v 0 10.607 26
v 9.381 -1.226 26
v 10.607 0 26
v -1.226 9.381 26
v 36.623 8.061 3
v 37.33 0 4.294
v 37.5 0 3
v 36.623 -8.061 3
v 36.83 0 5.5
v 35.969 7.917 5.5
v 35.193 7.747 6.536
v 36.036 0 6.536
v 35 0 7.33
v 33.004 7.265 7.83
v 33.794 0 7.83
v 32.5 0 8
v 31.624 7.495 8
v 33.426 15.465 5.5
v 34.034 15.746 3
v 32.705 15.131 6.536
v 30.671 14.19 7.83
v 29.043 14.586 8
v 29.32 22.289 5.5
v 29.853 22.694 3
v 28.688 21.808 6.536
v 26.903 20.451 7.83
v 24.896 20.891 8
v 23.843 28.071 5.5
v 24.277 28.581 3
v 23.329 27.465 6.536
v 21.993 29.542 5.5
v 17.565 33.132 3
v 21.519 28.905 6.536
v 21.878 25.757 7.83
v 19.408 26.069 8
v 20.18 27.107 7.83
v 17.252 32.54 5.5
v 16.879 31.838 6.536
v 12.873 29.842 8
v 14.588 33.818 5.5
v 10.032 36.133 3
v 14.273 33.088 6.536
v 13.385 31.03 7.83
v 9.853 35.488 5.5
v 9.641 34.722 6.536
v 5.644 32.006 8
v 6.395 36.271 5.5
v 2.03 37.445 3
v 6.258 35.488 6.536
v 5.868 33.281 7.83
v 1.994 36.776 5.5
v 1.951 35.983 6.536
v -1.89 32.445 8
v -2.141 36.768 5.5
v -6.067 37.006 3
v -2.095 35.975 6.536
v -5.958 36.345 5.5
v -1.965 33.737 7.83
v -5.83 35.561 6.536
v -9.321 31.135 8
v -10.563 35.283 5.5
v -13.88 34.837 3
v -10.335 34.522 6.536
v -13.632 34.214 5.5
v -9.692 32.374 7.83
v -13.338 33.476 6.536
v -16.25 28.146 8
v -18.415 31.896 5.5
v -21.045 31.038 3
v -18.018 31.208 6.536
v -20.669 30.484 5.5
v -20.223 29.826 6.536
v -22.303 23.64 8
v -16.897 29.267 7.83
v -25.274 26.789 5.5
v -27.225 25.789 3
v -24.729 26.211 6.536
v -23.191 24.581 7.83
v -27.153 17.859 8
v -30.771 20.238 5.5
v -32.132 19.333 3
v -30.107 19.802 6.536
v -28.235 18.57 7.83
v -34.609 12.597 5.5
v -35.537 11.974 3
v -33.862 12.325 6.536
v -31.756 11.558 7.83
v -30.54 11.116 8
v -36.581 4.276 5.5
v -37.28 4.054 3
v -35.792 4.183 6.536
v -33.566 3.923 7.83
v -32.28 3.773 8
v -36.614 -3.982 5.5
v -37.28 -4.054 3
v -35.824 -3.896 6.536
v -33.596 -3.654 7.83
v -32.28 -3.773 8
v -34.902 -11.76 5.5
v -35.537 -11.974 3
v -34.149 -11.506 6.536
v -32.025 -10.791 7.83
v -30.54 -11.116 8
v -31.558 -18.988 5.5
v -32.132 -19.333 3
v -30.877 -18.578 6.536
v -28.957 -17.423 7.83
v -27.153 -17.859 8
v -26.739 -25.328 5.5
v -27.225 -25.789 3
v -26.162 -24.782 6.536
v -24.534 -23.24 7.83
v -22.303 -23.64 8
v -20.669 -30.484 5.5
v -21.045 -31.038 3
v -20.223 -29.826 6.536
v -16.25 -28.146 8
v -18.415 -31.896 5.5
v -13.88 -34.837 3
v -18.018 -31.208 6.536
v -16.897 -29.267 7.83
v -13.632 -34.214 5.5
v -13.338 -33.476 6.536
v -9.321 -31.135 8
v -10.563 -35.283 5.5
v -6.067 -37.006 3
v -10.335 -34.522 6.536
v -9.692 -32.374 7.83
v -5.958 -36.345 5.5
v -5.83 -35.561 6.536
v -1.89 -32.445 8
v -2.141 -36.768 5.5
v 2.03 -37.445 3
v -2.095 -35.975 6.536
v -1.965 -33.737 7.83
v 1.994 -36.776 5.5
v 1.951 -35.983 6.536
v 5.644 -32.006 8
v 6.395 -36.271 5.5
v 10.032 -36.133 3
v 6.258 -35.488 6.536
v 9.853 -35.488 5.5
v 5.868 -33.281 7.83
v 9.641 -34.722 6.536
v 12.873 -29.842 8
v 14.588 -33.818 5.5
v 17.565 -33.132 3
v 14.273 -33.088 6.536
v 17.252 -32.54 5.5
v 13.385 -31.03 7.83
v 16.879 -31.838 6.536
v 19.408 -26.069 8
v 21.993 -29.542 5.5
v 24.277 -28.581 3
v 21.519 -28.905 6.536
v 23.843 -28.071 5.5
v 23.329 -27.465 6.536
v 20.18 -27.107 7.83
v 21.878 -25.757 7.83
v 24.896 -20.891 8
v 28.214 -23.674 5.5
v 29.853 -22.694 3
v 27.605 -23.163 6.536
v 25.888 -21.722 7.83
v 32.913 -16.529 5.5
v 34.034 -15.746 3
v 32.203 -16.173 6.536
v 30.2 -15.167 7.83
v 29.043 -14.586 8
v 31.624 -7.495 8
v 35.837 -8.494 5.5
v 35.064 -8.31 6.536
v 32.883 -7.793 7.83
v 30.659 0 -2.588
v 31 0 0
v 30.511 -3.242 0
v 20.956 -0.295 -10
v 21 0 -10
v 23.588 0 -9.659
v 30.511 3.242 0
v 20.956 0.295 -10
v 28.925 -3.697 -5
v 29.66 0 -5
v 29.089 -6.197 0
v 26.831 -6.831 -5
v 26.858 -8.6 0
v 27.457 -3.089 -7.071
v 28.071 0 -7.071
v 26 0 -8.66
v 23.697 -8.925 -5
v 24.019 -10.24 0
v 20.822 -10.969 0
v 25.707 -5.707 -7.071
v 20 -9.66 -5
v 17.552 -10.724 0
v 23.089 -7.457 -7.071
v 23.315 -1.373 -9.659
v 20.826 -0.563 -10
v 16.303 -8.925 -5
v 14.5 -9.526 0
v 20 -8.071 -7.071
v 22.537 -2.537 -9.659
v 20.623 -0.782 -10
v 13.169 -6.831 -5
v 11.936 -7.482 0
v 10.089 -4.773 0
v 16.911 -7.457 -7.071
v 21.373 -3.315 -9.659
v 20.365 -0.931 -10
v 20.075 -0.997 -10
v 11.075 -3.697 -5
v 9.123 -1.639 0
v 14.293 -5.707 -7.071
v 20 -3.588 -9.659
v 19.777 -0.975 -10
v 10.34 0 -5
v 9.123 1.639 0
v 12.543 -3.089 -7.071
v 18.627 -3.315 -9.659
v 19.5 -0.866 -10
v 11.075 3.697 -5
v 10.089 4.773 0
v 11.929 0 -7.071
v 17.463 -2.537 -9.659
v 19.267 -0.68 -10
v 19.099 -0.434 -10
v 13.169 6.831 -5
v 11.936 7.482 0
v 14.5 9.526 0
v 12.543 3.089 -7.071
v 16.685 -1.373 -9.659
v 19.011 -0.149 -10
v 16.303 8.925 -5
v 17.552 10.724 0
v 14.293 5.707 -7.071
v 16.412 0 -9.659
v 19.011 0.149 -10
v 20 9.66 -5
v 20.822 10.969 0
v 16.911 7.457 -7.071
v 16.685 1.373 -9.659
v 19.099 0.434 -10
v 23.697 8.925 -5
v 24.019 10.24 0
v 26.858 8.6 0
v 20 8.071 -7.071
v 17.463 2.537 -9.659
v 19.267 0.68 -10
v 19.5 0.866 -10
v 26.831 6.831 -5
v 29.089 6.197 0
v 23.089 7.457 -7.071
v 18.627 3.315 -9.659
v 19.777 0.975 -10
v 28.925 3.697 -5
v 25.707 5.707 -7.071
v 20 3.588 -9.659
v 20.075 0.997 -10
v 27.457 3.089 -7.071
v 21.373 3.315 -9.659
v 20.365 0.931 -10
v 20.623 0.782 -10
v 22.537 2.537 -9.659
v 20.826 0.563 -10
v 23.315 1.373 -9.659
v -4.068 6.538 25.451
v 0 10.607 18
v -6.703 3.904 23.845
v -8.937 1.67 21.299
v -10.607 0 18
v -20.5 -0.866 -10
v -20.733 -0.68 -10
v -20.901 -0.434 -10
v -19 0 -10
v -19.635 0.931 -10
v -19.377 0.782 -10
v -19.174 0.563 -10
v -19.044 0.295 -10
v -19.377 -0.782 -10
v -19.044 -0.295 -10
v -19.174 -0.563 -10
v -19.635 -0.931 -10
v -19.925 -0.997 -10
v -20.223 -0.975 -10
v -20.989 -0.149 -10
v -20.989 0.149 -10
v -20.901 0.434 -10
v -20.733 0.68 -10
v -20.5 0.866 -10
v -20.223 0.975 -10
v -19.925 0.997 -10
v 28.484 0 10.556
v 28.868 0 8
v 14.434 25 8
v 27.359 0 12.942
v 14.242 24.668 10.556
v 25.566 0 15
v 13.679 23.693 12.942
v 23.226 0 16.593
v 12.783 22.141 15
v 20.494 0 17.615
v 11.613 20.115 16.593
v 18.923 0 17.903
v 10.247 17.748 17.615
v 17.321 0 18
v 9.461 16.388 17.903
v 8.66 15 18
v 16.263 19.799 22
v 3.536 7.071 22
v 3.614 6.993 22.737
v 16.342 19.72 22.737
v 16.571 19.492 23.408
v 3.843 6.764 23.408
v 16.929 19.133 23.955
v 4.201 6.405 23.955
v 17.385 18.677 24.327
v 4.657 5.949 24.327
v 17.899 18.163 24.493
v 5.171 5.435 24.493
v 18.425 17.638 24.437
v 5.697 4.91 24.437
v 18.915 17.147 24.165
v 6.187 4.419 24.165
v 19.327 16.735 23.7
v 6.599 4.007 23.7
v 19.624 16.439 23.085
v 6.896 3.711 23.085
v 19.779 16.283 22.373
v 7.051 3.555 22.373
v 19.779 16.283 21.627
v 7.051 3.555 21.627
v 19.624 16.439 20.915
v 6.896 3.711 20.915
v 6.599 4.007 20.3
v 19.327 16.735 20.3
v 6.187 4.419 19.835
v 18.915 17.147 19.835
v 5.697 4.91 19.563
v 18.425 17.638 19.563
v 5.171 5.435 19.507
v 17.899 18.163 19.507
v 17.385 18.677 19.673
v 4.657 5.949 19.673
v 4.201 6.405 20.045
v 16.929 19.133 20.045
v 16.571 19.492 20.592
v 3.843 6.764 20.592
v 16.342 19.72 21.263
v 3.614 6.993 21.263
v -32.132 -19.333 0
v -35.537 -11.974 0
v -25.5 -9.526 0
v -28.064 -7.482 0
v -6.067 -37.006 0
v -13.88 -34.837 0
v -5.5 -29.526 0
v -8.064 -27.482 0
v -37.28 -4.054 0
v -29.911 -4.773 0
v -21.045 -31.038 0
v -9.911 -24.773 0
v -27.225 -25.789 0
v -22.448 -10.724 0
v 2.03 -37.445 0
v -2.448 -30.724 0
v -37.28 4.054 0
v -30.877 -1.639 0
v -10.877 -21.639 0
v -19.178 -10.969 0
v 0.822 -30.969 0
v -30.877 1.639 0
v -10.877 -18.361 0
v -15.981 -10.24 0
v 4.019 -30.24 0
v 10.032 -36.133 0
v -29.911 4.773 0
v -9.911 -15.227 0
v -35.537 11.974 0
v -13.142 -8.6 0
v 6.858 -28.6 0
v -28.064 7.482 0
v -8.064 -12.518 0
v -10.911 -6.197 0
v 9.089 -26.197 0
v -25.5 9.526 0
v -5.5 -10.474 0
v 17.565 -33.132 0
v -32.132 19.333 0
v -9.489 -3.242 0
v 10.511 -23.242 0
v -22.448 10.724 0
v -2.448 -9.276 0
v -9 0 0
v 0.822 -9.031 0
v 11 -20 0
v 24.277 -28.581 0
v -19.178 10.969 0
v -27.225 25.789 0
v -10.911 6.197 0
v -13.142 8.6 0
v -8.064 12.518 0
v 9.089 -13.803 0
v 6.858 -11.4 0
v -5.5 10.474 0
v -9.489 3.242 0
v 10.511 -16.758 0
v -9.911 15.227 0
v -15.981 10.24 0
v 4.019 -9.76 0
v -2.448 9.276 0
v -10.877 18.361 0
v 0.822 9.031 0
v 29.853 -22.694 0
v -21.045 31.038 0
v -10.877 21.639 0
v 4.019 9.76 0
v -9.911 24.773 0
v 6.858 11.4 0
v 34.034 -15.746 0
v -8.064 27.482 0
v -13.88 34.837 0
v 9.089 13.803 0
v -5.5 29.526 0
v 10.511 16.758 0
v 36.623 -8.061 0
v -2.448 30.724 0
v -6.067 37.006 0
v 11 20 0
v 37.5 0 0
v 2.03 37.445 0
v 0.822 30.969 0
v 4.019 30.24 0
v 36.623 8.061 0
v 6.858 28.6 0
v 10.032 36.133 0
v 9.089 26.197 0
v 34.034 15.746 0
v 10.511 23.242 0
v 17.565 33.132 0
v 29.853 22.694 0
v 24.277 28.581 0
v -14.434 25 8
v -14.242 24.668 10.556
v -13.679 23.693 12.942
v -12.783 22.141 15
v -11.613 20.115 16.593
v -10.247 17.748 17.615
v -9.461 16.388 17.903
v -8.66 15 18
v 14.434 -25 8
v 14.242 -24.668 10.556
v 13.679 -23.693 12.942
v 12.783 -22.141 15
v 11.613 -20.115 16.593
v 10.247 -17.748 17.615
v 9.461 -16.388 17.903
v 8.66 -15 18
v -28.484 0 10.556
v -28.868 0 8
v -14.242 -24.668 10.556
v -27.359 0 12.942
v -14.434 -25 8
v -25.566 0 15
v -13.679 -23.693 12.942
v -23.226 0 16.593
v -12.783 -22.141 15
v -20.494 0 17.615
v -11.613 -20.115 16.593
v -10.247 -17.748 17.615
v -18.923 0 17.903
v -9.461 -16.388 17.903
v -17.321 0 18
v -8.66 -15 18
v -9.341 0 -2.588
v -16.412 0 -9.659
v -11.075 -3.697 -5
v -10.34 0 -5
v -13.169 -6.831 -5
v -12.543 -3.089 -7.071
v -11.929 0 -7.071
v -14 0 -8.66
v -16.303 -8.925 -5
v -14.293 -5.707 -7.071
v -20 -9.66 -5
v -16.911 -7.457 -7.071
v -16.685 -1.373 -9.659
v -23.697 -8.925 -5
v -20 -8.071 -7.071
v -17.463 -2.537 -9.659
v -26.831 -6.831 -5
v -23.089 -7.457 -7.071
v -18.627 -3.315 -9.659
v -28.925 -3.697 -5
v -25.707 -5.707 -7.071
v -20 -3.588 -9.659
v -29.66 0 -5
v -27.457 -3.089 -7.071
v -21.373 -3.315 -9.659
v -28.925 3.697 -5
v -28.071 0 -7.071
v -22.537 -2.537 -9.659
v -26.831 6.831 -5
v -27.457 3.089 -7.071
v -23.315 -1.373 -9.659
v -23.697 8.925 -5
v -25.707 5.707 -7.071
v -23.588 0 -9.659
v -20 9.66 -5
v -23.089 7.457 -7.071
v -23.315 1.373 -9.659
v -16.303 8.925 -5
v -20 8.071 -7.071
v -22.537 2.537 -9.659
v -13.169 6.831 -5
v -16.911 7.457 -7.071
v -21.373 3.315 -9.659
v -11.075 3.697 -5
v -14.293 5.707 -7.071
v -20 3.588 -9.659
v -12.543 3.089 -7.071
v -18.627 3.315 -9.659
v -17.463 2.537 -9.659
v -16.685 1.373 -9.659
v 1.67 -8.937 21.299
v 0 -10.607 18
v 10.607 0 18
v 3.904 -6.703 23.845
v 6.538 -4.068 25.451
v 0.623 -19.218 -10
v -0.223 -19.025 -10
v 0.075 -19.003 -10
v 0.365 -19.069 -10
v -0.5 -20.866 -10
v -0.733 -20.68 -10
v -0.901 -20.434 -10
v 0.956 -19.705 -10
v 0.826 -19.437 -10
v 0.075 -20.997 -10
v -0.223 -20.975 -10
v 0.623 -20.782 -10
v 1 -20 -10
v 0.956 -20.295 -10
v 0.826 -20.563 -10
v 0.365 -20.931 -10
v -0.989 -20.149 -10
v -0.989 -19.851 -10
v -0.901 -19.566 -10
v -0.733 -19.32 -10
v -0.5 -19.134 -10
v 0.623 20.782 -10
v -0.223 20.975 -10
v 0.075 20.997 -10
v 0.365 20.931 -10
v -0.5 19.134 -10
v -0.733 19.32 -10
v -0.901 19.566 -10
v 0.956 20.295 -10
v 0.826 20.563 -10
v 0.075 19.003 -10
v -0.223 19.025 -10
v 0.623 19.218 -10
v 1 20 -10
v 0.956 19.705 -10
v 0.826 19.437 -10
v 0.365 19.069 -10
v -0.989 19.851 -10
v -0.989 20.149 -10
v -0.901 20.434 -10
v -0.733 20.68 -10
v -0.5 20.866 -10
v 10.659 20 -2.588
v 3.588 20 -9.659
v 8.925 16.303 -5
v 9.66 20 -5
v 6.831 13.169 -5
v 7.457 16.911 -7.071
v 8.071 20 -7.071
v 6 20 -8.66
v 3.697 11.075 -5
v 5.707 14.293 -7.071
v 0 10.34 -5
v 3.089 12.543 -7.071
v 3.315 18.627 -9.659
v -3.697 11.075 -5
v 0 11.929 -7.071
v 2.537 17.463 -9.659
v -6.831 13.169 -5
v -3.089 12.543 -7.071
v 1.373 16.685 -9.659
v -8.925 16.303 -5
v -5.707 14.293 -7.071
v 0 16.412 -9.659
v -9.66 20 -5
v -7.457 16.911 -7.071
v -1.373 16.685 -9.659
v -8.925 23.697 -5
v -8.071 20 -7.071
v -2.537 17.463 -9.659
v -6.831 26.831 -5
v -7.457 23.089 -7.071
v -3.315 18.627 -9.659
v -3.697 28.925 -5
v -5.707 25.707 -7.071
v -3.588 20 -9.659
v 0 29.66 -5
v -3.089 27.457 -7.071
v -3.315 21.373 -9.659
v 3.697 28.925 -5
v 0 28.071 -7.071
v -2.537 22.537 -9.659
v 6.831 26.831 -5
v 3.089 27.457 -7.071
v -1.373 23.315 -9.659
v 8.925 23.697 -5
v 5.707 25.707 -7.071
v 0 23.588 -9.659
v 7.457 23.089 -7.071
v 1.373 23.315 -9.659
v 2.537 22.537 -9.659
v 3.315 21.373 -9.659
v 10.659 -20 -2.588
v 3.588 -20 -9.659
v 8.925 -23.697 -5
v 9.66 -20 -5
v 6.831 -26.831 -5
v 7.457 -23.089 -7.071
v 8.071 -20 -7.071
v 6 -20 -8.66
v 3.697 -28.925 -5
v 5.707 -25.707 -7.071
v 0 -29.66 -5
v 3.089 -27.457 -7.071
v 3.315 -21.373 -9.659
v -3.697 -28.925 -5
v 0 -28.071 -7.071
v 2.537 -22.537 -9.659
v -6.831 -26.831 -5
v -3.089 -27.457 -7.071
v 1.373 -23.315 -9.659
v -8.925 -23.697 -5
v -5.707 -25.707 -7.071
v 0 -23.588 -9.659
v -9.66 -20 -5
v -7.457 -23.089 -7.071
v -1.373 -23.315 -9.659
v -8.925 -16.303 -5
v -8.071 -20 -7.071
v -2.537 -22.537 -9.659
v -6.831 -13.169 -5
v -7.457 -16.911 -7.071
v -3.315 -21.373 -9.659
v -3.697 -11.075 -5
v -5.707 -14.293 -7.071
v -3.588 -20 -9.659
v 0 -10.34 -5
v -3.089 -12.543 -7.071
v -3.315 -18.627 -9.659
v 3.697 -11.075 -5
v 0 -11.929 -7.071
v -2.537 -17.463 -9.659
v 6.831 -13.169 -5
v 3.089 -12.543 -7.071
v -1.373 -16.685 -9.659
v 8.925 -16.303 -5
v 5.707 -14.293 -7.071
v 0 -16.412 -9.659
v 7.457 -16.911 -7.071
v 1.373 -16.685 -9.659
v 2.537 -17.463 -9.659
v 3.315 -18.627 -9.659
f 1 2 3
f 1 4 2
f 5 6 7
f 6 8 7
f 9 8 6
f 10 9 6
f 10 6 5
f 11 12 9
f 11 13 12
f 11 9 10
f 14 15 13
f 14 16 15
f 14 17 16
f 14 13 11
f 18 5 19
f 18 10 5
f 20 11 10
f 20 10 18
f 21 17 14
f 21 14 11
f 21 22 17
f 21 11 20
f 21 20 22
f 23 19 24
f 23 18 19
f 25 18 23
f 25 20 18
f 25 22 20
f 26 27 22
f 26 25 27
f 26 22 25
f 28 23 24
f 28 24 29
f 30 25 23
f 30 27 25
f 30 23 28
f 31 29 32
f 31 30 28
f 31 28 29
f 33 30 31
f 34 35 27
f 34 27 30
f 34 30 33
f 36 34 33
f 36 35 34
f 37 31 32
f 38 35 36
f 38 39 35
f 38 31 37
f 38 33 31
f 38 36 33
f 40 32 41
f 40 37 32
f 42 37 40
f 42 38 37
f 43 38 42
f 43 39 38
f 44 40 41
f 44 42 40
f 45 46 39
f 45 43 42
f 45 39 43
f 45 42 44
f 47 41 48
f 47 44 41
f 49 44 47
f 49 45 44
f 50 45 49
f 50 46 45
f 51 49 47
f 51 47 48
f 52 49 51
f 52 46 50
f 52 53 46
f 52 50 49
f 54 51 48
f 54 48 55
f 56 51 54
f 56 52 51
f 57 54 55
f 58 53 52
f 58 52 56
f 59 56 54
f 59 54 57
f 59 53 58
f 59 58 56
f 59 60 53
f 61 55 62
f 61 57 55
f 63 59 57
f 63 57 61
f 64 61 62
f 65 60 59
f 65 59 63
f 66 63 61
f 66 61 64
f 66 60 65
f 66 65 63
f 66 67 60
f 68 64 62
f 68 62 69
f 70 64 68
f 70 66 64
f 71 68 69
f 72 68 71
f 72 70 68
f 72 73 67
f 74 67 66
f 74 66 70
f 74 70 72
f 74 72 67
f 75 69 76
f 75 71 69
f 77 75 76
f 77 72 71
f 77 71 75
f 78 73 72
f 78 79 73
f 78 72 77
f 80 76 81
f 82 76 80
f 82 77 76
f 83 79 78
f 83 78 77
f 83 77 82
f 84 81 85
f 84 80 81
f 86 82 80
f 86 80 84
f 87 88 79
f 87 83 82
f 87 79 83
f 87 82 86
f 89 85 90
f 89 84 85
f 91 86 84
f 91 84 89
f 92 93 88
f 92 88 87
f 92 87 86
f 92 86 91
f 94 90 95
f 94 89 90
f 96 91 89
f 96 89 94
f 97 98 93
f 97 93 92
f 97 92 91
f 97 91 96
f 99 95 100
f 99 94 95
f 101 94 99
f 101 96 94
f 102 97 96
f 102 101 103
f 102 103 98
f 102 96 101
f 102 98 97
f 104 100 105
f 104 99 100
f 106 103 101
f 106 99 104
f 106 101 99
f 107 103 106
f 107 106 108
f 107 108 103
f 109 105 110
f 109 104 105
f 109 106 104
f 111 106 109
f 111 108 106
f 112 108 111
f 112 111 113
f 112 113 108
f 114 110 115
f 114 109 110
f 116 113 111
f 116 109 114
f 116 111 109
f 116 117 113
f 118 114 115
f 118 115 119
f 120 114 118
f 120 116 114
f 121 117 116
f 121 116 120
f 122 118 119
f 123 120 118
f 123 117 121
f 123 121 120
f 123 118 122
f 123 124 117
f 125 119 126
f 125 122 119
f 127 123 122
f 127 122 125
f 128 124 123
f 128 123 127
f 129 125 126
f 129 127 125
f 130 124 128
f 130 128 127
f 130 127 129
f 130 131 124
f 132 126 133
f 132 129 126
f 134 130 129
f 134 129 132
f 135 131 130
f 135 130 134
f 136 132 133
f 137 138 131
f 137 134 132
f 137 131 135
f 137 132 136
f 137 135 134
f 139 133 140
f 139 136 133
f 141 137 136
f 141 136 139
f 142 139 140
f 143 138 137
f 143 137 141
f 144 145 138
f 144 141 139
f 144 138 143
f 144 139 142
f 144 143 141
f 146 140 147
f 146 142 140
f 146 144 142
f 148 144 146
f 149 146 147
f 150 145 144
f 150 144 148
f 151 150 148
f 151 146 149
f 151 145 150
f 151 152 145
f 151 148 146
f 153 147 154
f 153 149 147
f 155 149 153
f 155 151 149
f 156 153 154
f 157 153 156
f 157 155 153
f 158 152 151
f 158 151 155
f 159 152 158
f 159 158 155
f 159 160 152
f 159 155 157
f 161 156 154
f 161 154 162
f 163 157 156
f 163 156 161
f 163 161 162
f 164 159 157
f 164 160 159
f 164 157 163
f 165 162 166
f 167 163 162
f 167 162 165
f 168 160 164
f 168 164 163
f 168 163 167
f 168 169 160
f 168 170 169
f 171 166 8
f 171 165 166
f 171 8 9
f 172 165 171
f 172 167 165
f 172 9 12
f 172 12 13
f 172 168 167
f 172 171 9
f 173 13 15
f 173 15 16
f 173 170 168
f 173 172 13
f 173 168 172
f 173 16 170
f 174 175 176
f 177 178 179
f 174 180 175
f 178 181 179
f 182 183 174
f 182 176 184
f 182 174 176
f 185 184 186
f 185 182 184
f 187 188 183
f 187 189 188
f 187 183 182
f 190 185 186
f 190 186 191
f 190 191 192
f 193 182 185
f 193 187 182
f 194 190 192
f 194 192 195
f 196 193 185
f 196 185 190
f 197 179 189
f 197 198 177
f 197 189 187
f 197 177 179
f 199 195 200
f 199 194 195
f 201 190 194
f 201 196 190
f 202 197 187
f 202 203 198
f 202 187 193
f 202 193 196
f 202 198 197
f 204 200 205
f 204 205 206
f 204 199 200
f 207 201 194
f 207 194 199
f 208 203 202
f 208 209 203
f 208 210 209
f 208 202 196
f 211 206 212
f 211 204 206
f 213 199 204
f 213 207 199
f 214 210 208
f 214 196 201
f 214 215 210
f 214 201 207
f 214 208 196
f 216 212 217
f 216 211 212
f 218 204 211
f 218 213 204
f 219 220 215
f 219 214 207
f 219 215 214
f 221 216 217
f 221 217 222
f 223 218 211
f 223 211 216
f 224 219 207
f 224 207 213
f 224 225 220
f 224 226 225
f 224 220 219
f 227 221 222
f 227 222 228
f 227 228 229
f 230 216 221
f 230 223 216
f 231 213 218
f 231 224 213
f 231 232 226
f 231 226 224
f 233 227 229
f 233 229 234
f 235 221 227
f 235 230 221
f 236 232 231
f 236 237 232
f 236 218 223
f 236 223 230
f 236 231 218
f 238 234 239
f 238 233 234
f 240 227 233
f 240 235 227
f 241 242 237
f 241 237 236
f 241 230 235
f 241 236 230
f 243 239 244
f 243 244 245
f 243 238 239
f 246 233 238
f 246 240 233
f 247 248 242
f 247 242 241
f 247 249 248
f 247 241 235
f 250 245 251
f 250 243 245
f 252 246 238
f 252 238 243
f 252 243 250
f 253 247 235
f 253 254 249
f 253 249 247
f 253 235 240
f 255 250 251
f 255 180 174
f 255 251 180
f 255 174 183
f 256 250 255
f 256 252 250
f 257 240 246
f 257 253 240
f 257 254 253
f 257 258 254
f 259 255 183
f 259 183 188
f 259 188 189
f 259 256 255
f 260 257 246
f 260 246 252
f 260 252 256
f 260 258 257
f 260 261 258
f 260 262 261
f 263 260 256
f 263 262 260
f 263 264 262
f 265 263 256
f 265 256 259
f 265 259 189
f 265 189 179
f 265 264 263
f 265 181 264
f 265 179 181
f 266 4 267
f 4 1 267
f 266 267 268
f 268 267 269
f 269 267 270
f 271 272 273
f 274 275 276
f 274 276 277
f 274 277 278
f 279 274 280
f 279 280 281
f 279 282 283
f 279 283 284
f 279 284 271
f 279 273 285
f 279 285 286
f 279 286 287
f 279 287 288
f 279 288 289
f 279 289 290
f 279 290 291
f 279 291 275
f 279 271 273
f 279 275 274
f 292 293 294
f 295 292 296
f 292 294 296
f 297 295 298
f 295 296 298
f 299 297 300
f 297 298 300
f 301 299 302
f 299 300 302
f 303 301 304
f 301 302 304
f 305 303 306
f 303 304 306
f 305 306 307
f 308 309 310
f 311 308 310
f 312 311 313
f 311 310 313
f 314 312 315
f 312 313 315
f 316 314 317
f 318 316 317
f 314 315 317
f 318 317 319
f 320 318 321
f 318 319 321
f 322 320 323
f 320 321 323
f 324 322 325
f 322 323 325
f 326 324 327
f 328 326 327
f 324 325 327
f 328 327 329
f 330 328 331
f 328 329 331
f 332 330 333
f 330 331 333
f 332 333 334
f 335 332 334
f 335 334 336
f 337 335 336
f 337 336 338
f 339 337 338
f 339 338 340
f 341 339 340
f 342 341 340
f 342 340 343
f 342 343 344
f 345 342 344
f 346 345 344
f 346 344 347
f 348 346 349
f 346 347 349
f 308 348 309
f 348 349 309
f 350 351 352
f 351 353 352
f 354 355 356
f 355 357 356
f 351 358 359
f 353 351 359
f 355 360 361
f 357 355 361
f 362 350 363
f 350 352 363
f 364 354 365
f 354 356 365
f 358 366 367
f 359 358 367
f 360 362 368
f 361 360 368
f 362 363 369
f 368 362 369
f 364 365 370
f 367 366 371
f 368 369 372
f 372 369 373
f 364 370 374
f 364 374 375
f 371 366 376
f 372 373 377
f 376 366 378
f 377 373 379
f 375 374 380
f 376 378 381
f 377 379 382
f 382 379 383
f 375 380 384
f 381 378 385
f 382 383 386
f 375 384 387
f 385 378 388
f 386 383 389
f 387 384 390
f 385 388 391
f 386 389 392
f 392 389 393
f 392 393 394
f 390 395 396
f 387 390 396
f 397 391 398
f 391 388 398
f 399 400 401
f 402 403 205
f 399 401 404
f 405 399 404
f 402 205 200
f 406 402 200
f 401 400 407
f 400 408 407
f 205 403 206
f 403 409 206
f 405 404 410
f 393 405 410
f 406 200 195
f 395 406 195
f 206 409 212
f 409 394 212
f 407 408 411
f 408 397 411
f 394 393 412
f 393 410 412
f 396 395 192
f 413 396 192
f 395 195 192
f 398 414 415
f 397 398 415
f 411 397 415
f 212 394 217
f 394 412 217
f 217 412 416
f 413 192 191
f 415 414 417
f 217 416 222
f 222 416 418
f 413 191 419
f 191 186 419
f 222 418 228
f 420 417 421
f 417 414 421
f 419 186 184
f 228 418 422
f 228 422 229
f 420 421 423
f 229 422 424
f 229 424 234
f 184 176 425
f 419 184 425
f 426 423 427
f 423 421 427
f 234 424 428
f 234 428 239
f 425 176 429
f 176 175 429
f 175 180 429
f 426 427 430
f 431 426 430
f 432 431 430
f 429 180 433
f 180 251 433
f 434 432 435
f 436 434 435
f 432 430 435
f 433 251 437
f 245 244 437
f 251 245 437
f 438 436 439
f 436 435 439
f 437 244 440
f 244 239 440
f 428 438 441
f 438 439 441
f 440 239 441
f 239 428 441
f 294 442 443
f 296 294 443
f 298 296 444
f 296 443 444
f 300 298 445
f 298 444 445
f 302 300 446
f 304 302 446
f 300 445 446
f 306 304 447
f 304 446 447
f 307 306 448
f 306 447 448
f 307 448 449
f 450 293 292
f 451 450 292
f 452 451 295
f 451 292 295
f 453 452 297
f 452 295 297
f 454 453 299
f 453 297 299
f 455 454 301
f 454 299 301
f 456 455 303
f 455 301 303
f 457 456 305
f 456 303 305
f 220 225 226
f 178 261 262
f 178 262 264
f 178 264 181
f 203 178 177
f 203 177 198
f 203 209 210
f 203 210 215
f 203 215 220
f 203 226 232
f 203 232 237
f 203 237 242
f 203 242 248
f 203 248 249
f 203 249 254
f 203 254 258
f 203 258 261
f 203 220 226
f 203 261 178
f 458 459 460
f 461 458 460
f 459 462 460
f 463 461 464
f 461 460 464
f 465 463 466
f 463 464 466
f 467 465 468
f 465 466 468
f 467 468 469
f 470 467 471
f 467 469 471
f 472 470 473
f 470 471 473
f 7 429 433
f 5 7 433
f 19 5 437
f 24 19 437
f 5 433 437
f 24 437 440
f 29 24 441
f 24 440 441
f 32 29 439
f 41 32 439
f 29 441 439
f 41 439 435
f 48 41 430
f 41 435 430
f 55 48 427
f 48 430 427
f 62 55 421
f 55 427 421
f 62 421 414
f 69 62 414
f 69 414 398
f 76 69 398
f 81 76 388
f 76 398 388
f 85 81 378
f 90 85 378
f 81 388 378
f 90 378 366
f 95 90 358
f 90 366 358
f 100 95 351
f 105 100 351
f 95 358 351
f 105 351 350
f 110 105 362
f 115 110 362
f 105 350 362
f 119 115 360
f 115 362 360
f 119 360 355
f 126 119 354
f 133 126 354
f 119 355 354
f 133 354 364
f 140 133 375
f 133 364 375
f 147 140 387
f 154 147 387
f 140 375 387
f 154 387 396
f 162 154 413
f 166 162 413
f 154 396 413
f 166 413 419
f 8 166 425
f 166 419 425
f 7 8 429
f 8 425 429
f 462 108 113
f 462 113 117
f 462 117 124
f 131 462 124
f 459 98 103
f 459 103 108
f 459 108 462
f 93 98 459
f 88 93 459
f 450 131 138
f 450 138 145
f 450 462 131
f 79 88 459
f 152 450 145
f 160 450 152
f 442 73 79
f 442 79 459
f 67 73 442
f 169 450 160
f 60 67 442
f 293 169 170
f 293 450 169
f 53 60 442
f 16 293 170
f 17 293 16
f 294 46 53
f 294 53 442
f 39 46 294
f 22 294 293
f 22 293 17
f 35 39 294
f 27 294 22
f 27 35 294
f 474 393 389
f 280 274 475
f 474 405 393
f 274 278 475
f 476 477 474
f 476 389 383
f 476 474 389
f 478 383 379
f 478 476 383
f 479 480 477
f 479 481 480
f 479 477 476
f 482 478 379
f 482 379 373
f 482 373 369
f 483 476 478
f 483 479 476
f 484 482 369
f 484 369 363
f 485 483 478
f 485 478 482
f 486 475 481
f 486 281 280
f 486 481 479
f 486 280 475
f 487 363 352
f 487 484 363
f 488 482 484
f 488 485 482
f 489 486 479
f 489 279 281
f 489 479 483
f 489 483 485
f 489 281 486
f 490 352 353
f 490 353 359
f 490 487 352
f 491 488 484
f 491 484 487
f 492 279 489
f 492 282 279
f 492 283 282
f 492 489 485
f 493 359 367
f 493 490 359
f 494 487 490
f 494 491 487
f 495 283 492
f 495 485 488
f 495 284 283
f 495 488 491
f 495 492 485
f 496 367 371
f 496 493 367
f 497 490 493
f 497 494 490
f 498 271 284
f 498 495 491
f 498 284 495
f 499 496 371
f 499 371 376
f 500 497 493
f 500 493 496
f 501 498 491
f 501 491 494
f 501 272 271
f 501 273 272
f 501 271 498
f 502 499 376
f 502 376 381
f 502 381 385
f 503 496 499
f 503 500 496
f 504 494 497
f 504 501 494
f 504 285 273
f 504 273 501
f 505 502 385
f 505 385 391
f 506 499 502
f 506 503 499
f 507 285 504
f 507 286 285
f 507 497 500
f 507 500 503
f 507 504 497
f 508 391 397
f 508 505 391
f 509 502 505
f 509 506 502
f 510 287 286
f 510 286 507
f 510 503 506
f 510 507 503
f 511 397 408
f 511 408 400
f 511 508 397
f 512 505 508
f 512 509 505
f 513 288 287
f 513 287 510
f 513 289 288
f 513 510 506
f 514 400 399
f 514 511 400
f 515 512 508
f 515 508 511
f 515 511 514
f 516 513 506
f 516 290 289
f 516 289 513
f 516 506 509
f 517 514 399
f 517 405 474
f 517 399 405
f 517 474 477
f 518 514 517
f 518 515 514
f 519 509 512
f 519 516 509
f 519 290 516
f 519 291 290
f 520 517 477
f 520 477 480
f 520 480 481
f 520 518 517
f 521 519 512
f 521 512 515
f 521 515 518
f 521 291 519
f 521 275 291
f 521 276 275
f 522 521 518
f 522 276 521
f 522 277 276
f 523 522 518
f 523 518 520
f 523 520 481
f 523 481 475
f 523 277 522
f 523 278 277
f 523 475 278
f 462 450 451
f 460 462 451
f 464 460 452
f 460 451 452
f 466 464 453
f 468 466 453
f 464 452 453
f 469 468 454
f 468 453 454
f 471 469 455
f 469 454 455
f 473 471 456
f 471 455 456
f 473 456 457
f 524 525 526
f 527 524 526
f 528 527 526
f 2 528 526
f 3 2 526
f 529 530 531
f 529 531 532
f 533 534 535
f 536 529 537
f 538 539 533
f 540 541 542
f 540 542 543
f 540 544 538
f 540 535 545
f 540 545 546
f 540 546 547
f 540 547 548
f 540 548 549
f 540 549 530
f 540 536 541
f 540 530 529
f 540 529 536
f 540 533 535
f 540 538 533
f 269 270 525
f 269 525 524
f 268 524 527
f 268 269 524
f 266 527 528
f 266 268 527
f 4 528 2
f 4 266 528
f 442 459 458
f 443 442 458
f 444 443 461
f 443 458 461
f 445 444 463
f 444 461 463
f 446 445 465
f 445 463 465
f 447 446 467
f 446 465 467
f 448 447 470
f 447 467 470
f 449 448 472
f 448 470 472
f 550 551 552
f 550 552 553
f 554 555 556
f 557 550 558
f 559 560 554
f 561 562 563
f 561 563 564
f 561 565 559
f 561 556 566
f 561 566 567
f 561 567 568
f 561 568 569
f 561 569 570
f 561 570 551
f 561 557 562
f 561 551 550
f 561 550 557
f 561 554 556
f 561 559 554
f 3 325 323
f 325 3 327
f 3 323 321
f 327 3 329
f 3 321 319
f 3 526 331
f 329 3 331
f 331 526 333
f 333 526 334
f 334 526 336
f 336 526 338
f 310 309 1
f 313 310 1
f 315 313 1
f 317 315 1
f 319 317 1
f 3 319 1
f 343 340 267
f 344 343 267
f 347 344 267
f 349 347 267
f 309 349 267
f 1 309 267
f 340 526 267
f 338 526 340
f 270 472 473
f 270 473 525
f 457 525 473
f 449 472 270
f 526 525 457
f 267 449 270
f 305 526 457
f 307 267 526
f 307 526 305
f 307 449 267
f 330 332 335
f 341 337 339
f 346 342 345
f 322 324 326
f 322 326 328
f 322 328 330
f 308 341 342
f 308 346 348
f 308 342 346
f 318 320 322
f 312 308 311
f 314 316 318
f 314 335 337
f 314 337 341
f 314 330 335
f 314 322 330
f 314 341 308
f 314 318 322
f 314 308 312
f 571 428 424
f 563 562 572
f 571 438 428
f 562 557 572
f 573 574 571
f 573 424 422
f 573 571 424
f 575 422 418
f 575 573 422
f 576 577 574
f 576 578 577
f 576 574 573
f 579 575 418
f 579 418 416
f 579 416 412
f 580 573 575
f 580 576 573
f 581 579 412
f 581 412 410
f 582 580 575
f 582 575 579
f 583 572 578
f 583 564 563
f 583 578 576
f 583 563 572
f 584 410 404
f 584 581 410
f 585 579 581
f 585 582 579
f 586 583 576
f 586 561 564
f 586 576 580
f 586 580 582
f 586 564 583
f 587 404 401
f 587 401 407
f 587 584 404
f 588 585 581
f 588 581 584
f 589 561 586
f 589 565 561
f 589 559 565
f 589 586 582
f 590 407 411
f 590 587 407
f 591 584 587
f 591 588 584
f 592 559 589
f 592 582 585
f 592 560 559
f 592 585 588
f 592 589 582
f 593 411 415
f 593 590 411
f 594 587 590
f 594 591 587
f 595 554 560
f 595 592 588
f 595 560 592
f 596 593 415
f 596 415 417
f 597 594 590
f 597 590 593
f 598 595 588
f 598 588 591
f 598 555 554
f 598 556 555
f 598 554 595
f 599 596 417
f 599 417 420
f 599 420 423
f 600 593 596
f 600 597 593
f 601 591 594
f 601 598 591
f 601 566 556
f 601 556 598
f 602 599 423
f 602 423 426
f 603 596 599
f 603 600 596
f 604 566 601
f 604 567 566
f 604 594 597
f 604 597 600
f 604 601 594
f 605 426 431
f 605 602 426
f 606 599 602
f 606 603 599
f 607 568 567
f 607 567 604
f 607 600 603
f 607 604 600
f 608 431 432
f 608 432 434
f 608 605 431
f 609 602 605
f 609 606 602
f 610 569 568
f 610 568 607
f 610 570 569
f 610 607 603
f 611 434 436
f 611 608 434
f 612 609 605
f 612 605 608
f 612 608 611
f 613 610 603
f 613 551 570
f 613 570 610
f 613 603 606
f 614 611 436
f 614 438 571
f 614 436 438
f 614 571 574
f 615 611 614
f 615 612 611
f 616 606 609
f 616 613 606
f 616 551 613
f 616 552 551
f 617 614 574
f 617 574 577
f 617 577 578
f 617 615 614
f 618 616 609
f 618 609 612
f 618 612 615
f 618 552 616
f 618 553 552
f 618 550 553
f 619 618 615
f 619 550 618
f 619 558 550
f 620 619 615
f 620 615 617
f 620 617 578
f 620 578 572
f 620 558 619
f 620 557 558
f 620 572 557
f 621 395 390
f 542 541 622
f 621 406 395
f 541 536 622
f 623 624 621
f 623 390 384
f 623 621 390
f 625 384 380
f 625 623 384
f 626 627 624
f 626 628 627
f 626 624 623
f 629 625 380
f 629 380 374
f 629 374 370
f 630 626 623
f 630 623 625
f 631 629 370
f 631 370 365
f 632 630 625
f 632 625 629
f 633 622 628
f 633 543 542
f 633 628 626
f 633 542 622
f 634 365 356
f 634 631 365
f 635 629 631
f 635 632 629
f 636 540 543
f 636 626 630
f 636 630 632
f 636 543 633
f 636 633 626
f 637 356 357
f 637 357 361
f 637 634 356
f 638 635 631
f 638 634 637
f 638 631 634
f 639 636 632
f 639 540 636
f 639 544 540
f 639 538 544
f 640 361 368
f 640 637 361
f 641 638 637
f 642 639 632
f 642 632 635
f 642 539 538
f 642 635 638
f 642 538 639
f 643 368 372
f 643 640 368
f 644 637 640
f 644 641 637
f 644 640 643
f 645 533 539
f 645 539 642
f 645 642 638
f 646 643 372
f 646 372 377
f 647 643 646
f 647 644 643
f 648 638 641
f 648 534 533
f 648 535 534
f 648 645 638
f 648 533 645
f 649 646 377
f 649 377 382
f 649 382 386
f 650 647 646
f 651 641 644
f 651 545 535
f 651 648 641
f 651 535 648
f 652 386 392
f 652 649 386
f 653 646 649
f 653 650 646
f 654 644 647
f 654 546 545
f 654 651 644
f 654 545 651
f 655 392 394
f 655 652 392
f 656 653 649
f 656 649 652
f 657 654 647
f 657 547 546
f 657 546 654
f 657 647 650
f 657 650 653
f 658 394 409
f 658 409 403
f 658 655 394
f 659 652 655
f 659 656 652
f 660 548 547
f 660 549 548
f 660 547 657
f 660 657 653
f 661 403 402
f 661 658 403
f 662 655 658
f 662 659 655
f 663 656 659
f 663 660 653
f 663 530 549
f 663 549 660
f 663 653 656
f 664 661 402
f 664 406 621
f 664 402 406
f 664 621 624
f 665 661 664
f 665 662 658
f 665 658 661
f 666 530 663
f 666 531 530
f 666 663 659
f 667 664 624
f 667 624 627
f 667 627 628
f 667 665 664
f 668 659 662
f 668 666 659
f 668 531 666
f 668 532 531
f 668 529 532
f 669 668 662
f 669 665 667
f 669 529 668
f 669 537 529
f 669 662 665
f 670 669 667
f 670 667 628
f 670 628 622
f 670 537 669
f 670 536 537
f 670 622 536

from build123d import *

# Parameters (mm, degrees)
F0_R         = 37.5
F1_DEPTH     = 8
F2_R         = 5
F3_R         = 11
F4_DEPTH     = 10
F5_R         = 9.99999
F7_DEPTH     = 10
F8_R         = 9.99999
F10_DEPTH    = 18
F11_T1_DEPTH = 81.3324958071
F12_R        = 2.5
F13_DEPTH    = 18


# Not quite as in the source:
# - a fillet or chamfer that OpenCascade refuses, or shapes differently, is made with other operations: its cross-section is extruded or revolved along the edge and cut away or added
# - a fillet or chamfer is up to 0.001 mm smaller than in the source, because OpenCascade refuses the exact size


with BuildPart() as f1:
    # F0 (on Top) → F1 (new body)
    with BuildSketch(Plane.XY):
        Circle(F0_R)
    extrude(amount=F1_DEPTH)

    # F2
    f2_edges = [f1.edges().sort_by_distance(p)[0] for p in [
        (-37.5, 0, 8),
    ]]
    fillet(f2_edges, radius=F2_R)

    # F3 (on face) → F4 (join)
    with BuildSketch(Plane(origin=(0, 0, 0), x_dir=(1, 0, 0), z_dir=(0, 0, -1))):
        with Locations((20, 0)):
            Circle(F3_R)
        with Locations((-20, 0)):
            Circle(F3_R)
        with Locations((0, 20)):
            Circle(F3_R)
        with Locations((0, -20)):
            Circle(F3_R)
    extrude(amount=F4_DEPTH)

    # F5 (radius 10 in the source; OpenCascade refuses exactly that, so slightly less here)
    f5_edges = [f1.edges().sort_by_distance(p)[0] for p in [
        (-11, 20, -10),
        (-31, 0, -10),
        (-11, -20, -10),
        (9, 0, -10),
    ]]
    fillet(f5_edges, radius=F5_R)

    # F6 (on face) → F7 (join)
    with BuildSketch(Plane.XY.offset(8)):
        Polygon((14.4337567297, -25), (28.8675134595, 0), (14.4337567297, 25), (-14.4337567297, 25), (-28.8675134595, 0), (-14.4337567297, -25), align=None)
    extrude(amount=F7_DEPTH)

    # F8 (radius 10 in the source; OpenCascade refuses exactly that, so slightly less here)
    f8_edges = [f1.edges().sort_by_distance(p)[0] for p in [
        (0, -25, 18),
        (21.650635, -12.5, 18),
        (21.650635, 12.5, 18),
        (0, 25, 18),
        (-21.650635, 12.5, 18),
        (-21.650635, -12.5, 18),
    ]]
    fillet(f8_edges, radius=F8_R)

    # F9 (on face) → F10 (join)
    with BuildSketch(Plane.XY.offset(8)):
        Polygon((10.6066017178, 0), (0, 10.6066017178), (-10.6066017178, 0), (0, -10.6066017178), align=None)
    extrude(amount=F10_DEPTH)

    # F11: fillet of radius 15 on 1 edges, made by hand

    # F11_s2 → F11_t1 (cut)
    with BuildSketch(Plane(origin=(-28.755379658, 28.755379658, 0), x_dir=(0, 0, 1), z_dir=(0.7071067812, -0.7071067812, 0))):
        with BuildLine():
            ThreePointArc((18, 7.5), (23.8452325787, 1.979467531), (26, -5.7664991614))
            Line((26, -5.7664991614), (26, 7.5))
            Line((26, 7.5), (18, 7.5))
        make_face()
    extrude(amount=F11_T1_DEPTH, mode=Mode.SUBTRACT)

    # F12 (on face) → F13 (join)
    with BuildSketch(Plane(origin=(5.3033008589, 5.3033008589, 0), x_dir=(-0.7071067812, 0.7071067812, 0), z_dir=(0.7071067812, 0.7071067812, 0))):
        with Locations((0, 22)):
            Circle(F12_R)
    extrude(amount=F13_DEPTH)


solid = f1.part
